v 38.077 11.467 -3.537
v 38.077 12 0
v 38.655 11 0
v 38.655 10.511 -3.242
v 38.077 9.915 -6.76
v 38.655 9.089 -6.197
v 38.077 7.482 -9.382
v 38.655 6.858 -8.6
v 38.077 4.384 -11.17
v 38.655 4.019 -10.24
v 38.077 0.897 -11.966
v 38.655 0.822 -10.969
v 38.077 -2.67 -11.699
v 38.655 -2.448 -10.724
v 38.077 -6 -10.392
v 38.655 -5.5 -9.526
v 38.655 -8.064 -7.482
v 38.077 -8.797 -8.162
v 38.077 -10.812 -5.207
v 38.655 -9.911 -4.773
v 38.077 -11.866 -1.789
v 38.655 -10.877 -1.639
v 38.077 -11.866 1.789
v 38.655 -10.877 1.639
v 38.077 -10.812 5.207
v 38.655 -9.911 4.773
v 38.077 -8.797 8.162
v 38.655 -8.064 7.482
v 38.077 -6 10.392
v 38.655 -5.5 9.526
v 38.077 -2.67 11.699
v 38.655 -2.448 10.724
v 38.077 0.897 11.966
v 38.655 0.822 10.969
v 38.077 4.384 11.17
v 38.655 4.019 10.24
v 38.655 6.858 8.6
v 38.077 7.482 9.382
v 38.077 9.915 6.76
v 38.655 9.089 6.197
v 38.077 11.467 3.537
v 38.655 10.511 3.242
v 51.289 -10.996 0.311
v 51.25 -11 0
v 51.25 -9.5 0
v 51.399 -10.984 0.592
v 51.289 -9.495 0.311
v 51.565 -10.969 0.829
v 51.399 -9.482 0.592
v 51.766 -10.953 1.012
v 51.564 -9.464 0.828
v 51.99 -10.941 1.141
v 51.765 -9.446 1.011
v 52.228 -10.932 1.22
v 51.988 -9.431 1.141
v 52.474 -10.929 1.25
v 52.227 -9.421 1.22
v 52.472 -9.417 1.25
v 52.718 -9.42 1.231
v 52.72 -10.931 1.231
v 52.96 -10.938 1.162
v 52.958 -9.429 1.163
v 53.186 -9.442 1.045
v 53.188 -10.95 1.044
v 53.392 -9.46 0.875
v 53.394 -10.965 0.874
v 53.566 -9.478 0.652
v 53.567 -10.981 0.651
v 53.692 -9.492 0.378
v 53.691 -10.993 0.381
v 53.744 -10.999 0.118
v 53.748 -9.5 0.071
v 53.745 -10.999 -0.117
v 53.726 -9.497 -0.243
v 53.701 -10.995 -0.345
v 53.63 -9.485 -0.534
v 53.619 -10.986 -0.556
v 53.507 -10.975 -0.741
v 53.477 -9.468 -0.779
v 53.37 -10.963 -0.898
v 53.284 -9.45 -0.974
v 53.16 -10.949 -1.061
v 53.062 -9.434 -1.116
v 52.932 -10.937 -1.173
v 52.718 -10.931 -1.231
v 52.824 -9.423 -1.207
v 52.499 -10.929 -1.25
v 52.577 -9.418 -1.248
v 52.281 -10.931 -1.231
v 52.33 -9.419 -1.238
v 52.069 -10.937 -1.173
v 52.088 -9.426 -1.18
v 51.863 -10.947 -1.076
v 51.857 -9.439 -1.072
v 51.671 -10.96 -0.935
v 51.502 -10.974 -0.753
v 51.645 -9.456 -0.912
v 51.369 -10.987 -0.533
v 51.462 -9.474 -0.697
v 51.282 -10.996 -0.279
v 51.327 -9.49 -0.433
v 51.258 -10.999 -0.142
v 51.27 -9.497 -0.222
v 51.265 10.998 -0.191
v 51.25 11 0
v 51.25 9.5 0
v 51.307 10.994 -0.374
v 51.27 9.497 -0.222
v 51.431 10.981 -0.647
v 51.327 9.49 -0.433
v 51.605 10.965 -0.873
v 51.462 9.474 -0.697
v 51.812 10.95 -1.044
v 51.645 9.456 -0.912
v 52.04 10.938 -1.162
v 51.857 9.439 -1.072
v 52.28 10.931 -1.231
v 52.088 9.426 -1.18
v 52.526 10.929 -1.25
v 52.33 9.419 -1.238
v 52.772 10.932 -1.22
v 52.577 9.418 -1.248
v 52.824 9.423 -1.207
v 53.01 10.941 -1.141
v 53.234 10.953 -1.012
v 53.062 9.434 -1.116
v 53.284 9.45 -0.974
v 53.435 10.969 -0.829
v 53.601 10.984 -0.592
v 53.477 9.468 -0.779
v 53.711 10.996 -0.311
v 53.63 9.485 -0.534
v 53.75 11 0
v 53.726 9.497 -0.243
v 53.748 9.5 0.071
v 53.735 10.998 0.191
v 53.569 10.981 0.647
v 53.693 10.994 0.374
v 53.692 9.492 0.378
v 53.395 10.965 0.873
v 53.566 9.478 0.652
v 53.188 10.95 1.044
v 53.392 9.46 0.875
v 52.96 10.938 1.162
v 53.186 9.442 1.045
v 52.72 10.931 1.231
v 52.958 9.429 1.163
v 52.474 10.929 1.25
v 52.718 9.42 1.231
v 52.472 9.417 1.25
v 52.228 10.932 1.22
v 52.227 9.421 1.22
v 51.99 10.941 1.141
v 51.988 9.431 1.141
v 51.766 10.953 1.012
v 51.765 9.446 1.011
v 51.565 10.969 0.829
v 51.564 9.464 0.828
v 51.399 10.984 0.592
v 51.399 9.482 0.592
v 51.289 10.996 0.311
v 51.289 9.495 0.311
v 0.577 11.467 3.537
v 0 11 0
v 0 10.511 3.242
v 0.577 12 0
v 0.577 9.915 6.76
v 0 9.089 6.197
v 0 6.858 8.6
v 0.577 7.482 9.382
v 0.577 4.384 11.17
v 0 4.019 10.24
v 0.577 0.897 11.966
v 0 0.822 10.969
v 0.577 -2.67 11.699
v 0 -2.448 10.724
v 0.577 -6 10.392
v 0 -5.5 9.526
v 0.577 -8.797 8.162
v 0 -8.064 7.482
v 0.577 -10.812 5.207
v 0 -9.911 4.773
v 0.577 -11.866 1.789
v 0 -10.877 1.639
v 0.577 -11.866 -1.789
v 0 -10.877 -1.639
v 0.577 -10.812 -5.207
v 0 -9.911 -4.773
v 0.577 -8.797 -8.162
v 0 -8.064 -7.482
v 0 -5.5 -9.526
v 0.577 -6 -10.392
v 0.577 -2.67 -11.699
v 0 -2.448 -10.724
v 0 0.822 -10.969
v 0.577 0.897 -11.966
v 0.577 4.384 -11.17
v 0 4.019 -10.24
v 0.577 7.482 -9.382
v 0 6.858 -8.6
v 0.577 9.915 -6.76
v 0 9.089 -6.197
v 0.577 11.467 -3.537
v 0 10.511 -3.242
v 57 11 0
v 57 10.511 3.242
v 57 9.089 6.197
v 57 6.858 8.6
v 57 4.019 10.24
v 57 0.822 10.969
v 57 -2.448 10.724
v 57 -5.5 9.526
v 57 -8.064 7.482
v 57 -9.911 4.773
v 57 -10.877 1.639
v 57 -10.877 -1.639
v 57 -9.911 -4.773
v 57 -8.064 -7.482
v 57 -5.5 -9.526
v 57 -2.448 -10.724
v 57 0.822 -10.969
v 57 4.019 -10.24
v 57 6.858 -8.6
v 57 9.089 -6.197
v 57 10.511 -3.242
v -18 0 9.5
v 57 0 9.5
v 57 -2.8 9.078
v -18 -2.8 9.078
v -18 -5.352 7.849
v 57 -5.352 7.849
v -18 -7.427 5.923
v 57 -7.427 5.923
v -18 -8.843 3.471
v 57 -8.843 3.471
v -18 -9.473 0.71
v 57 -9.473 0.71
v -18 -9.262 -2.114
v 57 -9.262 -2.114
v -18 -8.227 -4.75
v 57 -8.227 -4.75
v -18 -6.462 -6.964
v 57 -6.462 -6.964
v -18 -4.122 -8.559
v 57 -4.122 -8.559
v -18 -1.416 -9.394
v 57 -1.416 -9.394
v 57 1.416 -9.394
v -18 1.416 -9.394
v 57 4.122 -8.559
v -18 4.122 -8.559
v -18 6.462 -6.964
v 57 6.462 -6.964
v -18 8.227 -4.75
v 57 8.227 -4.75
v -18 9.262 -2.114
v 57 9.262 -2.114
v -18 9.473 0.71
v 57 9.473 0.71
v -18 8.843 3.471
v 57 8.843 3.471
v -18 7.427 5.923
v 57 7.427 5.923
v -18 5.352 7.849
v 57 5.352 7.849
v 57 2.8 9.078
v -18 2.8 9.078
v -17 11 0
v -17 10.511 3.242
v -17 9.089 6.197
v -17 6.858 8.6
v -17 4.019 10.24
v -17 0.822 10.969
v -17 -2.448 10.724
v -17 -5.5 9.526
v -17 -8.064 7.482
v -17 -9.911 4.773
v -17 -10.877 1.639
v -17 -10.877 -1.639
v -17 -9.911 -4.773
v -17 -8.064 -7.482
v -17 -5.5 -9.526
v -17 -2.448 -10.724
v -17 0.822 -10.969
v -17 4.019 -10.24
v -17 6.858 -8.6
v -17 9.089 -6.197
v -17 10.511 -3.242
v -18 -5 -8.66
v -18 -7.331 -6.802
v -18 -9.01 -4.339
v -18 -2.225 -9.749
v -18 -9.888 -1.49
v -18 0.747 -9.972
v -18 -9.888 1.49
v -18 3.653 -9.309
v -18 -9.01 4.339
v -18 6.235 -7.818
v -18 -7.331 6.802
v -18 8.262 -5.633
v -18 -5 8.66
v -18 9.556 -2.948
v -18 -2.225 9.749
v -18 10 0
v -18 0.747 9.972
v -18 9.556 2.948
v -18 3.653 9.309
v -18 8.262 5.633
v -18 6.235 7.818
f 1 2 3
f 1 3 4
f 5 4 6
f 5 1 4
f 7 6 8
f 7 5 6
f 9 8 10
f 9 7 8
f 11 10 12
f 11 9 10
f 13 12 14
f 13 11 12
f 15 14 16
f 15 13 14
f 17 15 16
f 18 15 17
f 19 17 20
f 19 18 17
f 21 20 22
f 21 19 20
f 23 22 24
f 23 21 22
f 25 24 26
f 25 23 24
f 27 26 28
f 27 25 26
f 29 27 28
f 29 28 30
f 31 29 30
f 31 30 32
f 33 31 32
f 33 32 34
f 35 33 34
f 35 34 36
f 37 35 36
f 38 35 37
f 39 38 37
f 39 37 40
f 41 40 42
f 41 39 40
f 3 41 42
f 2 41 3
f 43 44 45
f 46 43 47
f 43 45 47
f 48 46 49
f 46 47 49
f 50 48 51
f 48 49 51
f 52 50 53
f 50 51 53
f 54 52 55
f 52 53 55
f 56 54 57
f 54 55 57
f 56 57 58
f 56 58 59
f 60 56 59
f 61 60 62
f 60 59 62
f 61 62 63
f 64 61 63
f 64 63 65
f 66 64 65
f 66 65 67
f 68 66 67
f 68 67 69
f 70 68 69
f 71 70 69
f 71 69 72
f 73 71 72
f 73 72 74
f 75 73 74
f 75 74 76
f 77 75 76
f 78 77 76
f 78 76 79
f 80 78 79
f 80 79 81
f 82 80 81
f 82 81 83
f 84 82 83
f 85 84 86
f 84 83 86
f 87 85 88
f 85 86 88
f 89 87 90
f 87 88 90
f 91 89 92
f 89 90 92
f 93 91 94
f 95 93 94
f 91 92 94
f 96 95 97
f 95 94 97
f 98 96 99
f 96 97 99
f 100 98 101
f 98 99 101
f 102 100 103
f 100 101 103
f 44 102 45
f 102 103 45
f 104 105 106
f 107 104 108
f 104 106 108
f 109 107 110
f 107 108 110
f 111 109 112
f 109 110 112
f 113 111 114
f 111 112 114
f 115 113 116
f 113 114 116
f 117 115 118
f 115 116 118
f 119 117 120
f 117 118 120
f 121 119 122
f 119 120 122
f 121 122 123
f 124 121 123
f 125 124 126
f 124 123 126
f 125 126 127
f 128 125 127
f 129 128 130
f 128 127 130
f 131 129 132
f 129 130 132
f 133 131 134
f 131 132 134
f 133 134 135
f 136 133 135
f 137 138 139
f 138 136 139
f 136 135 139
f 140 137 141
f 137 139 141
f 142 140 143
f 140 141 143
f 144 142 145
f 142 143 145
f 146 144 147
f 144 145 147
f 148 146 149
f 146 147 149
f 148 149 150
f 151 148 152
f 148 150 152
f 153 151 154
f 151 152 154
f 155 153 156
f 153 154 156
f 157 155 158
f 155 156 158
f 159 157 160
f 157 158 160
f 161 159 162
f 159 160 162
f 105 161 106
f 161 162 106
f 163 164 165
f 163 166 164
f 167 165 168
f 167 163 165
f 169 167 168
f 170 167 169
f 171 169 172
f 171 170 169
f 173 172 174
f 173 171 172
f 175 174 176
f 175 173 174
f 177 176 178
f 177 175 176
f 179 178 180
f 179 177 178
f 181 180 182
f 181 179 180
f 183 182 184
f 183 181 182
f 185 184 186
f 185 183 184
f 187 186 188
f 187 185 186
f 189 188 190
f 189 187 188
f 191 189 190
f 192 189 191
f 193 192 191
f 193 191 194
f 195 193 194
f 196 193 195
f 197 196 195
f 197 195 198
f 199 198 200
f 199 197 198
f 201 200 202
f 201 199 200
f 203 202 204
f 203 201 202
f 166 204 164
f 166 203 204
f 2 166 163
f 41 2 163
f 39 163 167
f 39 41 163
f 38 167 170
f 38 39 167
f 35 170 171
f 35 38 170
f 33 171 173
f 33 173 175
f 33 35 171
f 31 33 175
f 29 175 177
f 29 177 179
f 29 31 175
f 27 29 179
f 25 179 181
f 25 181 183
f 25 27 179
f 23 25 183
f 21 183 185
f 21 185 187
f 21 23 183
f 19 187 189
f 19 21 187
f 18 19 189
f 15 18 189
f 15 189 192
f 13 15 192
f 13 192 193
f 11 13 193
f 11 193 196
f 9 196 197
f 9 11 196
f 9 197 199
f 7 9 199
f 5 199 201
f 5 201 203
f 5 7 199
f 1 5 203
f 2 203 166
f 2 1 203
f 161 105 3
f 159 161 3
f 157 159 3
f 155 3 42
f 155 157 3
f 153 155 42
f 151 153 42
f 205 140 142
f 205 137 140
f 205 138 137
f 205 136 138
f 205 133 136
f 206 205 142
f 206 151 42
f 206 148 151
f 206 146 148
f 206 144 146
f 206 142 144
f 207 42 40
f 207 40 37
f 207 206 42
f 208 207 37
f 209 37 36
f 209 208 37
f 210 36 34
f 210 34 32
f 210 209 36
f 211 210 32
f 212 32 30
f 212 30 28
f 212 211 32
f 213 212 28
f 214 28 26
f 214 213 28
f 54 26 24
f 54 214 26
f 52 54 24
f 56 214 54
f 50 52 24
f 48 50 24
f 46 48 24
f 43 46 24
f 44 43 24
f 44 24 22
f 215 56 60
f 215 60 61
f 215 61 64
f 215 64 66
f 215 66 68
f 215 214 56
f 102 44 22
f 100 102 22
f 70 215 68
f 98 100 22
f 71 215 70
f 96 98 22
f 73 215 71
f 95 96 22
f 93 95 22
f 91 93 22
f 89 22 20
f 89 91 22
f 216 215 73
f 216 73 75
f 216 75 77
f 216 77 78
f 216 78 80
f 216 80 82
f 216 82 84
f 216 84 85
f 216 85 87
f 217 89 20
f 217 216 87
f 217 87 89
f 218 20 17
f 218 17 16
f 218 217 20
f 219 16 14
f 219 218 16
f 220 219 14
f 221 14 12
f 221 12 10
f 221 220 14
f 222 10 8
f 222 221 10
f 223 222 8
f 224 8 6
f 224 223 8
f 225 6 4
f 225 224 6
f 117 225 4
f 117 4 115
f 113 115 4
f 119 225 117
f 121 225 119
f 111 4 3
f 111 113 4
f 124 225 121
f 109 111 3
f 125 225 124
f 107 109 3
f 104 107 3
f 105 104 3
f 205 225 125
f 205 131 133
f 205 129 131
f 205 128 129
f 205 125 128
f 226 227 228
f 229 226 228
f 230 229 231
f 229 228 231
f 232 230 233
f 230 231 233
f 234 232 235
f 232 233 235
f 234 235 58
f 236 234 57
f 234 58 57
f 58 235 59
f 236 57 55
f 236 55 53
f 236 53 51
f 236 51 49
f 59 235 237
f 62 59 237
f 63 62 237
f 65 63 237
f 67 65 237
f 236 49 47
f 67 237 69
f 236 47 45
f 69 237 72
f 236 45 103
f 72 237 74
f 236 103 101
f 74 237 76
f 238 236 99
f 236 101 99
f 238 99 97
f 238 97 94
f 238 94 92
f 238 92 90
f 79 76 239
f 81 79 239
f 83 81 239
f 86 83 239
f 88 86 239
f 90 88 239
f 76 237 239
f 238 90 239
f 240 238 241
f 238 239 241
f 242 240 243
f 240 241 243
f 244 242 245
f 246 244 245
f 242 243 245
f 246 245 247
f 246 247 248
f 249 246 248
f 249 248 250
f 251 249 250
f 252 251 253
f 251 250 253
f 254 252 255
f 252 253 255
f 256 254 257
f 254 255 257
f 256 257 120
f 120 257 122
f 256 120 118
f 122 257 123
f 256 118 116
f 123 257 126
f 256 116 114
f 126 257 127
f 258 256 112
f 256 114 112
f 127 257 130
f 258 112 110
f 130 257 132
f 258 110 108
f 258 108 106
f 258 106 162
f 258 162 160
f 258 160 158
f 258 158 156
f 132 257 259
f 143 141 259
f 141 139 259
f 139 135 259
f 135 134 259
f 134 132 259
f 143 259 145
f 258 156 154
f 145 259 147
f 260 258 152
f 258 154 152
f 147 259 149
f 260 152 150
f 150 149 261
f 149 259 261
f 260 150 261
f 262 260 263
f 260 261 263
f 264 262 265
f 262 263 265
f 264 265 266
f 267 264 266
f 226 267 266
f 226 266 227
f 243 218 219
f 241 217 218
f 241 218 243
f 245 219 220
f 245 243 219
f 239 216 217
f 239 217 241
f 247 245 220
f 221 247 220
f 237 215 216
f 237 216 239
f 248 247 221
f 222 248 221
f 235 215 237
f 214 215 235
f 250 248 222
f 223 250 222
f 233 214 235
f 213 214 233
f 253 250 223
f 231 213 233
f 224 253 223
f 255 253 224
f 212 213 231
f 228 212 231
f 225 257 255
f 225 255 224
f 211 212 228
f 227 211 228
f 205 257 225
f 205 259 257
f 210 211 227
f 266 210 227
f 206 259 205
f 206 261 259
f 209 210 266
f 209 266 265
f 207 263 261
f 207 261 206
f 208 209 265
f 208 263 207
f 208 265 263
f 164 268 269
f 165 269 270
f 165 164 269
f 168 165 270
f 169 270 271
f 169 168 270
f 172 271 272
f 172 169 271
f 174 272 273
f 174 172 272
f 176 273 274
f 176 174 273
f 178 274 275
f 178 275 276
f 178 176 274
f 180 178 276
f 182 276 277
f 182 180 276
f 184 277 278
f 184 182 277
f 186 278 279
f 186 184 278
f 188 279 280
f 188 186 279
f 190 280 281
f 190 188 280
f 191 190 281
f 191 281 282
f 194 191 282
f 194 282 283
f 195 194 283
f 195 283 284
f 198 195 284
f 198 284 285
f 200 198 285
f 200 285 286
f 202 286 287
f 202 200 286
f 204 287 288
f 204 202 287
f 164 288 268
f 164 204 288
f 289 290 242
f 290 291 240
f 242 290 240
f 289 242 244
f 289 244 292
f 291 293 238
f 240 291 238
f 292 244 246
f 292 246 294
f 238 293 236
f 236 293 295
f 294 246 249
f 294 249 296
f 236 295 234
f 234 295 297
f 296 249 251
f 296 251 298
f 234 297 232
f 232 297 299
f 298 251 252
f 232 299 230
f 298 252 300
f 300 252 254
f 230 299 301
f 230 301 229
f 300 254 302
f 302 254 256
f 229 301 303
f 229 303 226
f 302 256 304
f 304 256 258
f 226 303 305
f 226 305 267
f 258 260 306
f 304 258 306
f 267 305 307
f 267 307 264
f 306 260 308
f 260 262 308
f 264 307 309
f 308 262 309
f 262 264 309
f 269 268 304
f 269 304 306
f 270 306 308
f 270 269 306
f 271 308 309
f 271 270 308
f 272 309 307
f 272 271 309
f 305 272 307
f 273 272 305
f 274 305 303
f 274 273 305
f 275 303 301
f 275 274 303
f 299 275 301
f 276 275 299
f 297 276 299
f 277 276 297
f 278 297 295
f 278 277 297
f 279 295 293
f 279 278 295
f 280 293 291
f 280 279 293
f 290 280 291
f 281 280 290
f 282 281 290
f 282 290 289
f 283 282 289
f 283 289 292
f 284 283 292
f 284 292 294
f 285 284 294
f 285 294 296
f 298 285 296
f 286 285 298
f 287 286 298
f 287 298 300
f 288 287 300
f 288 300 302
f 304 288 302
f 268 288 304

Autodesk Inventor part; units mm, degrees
ref_plane "YZ Plane" through (0, 0, 0) normal (1, 0, 0) x (0, 1, 0)
ref_plane "XZ Plane" through (0, 0, 0) normal (0, 1, 0) x (-1, 0, 0)
ref_plane "XY Plane" through (0, 0, 0) normal (0, 0, 1) x (1, 0, 0)
sketch "Profile" plane through (0, 0, 0) normal (0, 0, 1) x (1, 0, 0)
  line L0 (-18, 0) -> (-18, 11)
  line L1 (-18, 11) -> (0, 11)
  line L2 (0, 11) -> (0.5774, 12)
  line L3 (0.5774, 12) -> (38.0774, 12)
  line L4 (38.0774, 12) -> (38.6547, 11)
  line L5 (38.6547, 11) -> (57, 11)
  line L6 (57, 11) -> (57, 0)
  line L7 (-18, 0) -> (0, 0)
  line L8 (0, 0) -> (0, 9)
  line L9 (0, 9) -> (49, 9)
  line L10 (49, 9) -> (49, 0)
  line L11 (49, 0) -> (57, 0)
  line L12 (-33, 0) -> (72, 0) construction
  line L13 (0, 11) -> (0, 9) construction
  dimension "BodyLength" = 75
  dimension "d1" = 11
  dimension "d3" = 120
  dimension "d4" = 120
  dimension "d5" = 37.5
  dimension "d6" = 18
  dimension "d16" = 8
  dimension "d29" = 1
  dimension "d30" = 9
revolve "ProfileRevolveFeature" add sketch "Profile" angle 360 about axis through (-10, 0, 0) along (1, 0, 0)
sketch "InsideHole" plane through (-18, 0, 0) normal (-1, 0, 0) x (0, 0, 1)
  circle A0 centre (0, 0) radius 9 construction
hole "InsideHoleFeature" at (-18, 0, 0) direction (1, 0, 0) diameter 19 end through all
chamfer "EndChamferFeature" distance 1 angle 45 1 edges at (-18, -11, 0)
sketch "CapMountHole" plane through (0, 0, 0) normal (0, 1, 0) x (-1, 0, 0)
  line L0 (-57, 11) -> (-57, -11) construction
  line L1 (14.44, 0) -> (-86.64, 0) construction
  circle A0 centre (-52.5, 0) radius 1.25
  point P0 (0, 0)
  dimension "d31" = 4.5
  dimension "d39" = 2.5
extrude "CapMountHoleFeature" cut sketch "CapMountHole" along normal through all both and the other way through all
equation "\"d5\" = 0.5 * BodyLength"
equation "\"d6\" = 0.24 * BodyLength"
properties part number "BackPair1PistonBody"
